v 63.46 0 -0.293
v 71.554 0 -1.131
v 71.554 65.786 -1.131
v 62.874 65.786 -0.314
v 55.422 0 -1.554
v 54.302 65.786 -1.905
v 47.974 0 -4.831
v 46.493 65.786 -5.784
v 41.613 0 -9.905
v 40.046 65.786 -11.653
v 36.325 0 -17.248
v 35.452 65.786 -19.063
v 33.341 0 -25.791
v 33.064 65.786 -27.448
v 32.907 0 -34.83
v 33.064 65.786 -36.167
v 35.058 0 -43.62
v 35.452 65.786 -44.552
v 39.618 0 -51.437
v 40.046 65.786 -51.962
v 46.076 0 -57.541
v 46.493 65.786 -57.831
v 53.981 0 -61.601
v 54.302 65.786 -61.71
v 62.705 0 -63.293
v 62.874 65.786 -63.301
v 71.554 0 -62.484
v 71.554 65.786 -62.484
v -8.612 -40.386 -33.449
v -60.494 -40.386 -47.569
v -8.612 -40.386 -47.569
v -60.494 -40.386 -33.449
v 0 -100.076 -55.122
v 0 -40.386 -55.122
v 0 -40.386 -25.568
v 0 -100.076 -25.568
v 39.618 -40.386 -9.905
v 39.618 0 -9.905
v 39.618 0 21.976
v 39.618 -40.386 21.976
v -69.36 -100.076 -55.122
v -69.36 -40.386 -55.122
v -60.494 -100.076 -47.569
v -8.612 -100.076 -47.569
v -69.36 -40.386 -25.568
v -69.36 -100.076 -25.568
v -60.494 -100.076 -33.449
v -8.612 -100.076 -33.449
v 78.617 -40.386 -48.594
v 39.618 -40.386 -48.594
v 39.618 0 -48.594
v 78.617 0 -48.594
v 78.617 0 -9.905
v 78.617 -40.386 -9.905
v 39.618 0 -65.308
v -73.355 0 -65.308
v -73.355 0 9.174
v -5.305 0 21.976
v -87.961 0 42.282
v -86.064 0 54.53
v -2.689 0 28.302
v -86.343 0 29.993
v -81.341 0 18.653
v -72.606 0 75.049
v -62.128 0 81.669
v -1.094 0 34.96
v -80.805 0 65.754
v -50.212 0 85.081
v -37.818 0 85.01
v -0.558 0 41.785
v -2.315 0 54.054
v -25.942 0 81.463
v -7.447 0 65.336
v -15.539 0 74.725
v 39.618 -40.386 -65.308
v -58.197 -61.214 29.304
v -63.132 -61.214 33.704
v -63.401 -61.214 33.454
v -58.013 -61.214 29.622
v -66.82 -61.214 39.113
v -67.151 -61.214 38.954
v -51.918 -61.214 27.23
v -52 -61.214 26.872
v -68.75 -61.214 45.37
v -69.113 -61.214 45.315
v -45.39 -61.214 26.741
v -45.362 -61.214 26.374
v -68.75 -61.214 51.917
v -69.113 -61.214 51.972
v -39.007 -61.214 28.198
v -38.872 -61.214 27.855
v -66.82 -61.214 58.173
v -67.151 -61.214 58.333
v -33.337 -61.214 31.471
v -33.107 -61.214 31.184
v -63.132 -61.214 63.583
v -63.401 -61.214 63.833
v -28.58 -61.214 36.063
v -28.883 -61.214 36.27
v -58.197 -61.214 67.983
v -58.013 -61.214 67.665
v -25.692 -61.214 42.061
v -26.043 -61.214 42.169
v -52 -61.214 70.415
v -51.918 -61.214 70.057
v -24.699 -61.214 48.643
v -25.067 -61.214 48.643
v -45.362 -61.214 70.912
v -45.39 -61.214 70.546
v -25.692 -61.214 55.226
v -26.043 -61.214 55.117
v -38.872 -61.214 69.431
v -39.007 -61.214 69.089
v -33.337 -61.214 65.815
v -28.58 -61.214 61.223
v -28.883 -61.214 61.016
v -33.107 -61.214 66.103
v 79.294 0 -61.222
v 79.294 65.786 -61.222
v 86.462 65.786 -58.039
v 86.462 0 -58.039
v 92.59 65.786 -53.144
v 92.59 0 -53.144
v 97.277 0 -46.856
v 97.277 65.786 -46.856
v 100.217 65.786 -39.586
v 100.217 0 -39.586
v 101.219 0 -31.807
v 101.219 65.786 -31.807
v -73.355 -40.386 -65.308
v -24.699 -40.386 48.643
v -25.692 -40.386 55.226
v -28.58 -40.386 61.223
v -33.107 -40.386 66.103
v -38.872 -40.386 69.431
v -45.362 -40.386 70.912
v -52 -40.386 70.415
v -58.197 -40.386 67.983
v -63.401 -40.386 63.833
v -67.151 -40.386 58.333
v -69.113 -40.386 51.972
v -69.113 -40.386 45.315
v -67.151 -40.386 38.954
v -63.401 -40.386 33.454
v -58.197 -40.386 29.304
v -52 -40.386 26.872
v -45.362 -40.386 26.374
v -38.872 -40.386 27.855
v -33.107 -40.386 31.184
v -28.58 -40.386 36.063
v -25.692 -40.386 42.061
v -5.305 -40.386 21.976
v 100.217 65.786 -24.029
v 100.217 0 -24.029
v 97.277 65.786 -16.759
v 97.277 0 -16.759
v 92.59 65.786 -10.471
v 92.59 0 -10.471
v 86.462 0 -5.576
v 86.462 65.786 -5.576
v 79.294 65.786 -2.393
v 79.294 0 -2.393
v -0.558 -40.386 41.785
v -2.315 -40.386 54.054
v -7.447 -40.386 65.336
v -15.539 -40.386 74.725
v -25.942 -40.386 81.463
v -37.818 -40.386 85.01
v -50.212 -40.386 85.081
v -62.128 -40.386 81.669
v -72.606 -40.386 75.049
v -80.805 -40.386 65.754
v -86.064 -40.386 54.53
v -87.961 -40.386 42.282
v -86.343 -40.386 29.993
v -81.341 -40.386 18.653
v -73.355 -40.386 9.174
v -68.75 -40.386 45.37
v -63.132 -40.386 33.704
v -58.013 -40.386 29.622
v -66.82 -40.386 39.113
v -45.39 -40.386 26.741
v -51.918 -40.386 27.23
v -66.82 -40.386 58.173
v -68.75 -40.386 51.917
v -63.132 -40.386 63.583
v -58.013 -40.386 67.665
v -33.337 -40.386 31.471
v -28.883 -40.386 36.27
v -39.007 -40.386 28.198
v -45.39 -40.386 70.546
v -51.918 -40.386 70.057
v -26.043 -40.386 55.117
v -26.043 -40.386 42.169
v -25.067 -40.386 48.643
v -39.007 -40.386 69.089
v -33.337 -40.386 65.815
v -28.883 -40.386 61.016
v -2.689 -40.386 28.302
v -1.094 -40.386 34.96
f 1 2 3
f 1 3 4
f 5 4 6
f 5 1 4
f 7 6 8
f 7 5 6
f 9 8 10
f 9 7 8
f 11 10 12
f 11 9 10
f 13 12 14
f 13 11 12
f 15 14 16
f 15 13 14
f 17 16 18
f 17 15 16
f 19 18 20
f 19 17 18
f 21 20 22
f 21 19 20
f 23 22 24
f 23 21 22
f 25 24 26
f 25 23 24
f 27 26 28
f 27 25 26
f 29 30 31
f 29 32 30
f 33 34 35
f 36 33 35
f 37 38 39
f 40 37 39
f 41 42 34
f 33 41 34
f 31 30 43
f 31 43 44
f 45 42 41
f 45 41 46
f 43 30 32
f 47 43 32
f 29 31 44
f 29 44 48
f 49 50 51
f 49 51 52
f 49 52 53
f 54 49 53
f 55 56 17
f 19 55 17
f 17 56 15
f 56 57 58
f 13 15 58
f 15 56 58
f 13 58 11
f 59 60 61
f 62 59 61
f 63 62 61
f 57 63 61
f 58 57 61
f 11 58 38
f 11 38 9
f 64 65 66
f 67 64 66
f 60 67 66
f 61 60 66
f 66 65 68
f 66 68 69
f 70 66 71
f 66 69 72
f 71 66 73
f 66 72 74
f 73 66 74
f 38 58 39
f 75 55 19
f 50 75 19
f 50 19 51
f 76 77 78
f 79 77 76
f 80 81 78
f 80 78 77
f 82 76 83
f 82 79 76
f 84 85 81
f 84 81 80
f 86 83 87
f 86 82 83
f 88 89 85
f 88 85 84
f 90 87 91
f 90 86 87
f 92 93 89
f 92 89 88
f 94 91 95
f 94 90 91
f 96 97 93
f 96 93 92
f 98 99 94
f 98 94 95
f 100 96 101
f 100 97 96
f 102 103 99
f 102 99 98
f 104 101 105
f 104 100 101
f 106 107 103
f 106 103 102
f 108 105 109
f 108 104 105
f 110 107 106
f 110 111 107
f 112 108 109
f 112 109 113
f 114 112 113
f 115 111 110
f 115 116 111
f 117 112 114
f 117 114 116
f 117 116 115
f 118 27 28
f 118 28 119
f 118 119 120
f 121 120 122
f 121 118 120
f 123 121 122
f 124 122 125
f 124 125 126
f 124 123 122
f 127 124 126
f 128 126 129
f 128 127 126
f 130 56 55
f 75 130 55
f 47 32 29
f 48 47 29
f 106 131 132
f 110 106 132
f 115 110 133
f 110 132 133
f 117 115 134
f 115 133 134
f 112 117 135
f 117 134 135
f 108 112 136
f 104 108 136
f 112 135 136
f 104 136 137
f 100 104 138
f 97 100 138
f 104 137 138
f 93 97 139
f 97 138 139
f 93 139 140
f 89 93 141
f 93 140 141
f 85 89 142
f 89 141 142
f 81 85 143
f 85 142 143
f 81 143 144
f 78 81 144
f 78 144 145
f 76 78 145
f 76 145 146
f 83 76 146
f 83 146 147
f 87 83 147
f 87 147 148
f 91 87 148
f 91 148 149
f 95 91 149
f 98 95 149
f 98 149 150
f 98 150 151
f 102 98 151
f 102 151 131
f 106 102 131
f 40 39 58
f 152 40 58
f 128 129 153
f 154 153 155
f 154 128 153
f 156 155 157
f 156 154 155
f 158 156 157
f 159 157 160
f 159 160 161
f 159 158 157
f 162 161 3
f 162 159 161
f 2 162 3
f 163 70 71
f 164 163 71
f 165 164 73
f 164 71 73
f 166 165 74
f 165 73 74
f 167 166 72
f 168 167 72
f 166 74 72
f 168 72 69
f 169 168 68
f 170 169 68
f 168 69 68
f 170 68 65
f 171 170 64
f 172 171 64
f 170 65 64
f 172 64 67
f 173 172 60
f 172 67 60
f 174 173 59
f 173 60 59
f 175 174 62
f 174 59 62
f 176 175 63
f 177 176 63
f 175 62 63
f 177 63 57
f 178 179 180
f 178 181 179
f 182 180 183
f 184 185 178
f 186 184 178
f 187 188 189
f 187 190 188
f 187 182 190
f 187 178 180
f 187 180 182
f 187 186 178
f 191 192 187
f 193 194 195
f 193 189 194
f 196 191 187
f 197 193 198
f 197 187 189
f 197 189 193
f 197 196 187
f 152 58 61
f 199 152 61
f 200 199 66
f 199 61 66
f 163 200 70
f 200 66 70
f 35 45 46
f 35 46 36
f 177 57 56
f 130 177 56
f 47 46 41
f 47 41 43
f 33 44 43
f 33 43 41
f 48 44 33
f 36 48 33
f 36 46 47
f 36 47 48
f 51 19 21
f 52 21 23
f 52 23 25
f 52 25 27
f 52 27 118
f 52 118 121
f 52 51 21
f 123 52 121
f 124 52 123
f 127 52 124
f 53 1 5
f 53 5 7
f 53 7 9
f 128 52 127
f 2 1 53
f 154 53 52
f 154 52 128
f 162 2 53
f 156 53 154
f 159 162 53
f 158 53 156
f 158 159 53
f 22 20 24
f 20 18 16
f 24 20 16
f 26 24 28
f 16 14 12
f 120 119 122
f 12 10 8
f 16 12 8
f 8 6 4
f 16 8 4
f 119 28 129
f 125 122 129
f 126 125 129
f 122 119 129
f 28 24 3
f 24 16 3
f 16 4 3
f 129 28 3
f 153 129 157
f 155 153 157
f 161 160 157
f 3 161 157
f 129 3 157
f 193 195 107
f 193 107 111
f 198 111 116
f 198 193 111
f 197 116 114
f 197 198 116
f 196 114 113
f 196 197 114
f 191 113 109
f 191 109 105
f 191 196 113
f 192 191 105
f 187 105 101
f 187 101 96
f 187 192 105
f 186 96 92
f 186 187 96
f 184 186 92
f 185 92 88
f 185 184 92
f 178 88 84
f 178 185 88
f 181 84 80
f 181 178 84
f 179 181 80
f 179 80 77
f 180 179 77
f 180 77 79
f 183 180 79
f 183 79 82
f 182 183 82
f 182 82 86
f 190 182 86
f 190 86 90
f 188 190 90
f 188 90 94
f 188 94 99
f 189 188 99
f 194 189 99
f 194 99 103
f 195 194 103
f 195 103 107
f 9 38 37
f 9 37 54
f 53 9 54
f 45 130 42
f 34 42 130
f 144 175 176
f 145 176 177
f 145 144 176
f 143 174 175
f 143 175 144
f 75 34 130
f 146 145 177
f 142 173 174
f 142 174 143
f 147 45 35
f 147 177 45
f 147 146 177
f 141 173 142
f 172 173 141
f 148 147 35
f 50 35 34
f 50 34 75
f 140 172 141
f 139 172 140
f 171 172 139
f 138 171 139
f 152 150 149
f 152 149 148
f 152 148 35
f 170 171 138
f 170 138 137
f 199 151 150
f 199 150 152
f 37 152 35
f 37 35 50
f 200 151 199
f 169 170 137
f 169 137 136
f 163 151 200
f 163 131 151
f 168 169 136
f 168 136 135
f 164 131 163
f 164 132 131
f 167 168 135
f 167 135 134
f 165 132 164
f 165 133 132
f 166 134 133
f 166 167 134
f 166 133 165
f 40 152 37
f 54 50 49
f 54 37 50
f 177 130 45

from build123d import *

# Parameters (mm, degrees)
F0_W     = 107.0926934481
F0_H     = 38.6895574629
F0_W_2   = 38.9990732074
F1_DEPTH = 40.386
F2_R     = 22.3315998305
F2_R_2   = 21.9640238971
F3_DEPTH = 61.214
F4_W     = 69.3601816893
F4_H     = 29.5533258468
F4_W_2   = 51.8825063482
F4_H_2   = 14.1199231148
F5_DEPTH = 100.076
F7_DEPTH = 65.786


with BuildPart() as f1:
    # F0 (on Front) → F1 (new body)
    with BuildSketch(Plane.XZ):
        with BuildLine():
            ThreePointArc((-5.3047918225, 21.9756681472), (-1.760973589, 31.599753627), (-0.5576112402, 41.784722358))
            ThreePointArc((-0.5576112402, 41.784722358), (-62.1276824989, 81.6689250655), (-73.3553990722, 9.1736722487))
            Line((-73.3553990722, 9.1736722487), (-73.3553990722, 21.9756681472))
            Line((-73.3553990722, 21.9756681472), (-5.3047918225, 21.9756681472))
        make_face()
        with BuildLine():
            Line((-73.3553990722, 21.9756681472), (-73.3553990722, 9.1736722487))
            ThreePointArc((-73.3553990722, 9.1736722487), (-36.1809302997, -1.1651102493), (-5.3047918225, 21.9756681472))
            Line((-5.3047918225, 21.9756681472), (-73.3553990722, 21.9756681472))
        make_face()
        with BuildLine():
            ThreePointArc((-5.3047918225, 21.9756681472), (-36.1809302997, -1.1651102493), (-73.3553990722, 9.1736722487))
            Line((-73.3553990722, 9.1736722487), (-73.3553990722, -65.3079673648))
            Line((-73.3553990722, -65.3079673648), (39.6181046963, -65.3079673648))
            Line((39.6181046963, -65.3079673648), (39.6181046963, -48.594083637))
            Line((39.6181046963, -48.594083637), (-67.4745887518, -48.594083637))
            Line((-67.4745887518, -48.594083637), (-67.4745887518, -9.9045261741))
            Line((-67.4745887518, -9.9045261741), (39.6181046963, -9.9045261741))
            Line((39.6181046963, -9.9045261741), (39.6181046963, 21.9756681472))
            Line((39.6181046963, 21.9756681472), (-5.3047918225, 21.9756681472))
        make_face()
        with Locations((-13.9282420278, -29.2493049055)):
            Rectangle(F0_W, F0_H)
        with Locations((59.1176413, -29.2493049055)):
            Rectangle(F0_W_2, F0_H)
    extrude(amount=F1_DEPTH)

    # F2 (on Front) → F3 (join)
    with BuildSketch(Plane.XZ):
        with Locations((-47.0310002565, 48.6432611942)):
            Circle(F2_R)
        with Locations((-47.0310002565, 48.6432611942)):
            Circle(F2_R_2, mode=Mode.SUBTRACT)
    extrude(amount=F3_DEPTH)

    # F4 (on Front) → F5 (join)
    with BuildSketch(Plane.XZ):
        with Locations((-34.6800908446, -40.3450904414)):
            Rectangle(F4_W, F4_H)
        with Locations((-34.5529275946, -40.5092760921)):
            Rectangle(F4_W_2, F4_H_2, mode=Mode.SUBTRACT)
    extrude(amount=F5_DEPTH)

    # F6 (on Front) → F7 (join)
    with BuildSketch(Plane.XZ):
        with BuildLine():
            ThreePointArc((71.5539108322, -62.4836369352), (89.0145397665, -51.3617017106), (95.8118023382, -31.8074636161))
            ThreePointArc((95.8118023382, -31.8074636161), (89.0145397665, -12.2532255217), (71.5539108322, -1.1312902971))
            ThreePointArc((71.5539108322, -1.1312902971), (39.8321670237, -31.8074636161), (71.5539108322, -62.4836369352))
        make_face()
        with BuildLine():
            ThreePointArc((71.5539108322, -1.1312902971), (89.0145397665, -12.2532255217), (95.8118023382, -31.8074636161))
            ThreePointArc((95.8118023382, -31.8074636161), (89.0145397665, -51.3617017106), (71.5539108322, -62.4836369352))
            ThreePointArc((71.5539108322, -62.4836369352), (92.5896637981, -53.1443080624), (101.2189763841, -31.8074636161))
            ThreePointArc((101.2189763841, -31.8074636161), (92.5896637981, -10.4706191698), (71.5539108322, -1.1312902971))
        make_face()
        with BuildLine():
            ThreePointArc((71.5539108322, -62.4836369352), (39.8321670237, -31.8074636161), (71.5539108322, -1.1312902971))
            ThreePointArc((71.5539108322, -1.1312902971), (32.7612725987, -31.8074636161), (71.5539108322, -62.4836369352))
        make_face()
    extrude(amount=-F7_DEPTH)


solid = f1.part
